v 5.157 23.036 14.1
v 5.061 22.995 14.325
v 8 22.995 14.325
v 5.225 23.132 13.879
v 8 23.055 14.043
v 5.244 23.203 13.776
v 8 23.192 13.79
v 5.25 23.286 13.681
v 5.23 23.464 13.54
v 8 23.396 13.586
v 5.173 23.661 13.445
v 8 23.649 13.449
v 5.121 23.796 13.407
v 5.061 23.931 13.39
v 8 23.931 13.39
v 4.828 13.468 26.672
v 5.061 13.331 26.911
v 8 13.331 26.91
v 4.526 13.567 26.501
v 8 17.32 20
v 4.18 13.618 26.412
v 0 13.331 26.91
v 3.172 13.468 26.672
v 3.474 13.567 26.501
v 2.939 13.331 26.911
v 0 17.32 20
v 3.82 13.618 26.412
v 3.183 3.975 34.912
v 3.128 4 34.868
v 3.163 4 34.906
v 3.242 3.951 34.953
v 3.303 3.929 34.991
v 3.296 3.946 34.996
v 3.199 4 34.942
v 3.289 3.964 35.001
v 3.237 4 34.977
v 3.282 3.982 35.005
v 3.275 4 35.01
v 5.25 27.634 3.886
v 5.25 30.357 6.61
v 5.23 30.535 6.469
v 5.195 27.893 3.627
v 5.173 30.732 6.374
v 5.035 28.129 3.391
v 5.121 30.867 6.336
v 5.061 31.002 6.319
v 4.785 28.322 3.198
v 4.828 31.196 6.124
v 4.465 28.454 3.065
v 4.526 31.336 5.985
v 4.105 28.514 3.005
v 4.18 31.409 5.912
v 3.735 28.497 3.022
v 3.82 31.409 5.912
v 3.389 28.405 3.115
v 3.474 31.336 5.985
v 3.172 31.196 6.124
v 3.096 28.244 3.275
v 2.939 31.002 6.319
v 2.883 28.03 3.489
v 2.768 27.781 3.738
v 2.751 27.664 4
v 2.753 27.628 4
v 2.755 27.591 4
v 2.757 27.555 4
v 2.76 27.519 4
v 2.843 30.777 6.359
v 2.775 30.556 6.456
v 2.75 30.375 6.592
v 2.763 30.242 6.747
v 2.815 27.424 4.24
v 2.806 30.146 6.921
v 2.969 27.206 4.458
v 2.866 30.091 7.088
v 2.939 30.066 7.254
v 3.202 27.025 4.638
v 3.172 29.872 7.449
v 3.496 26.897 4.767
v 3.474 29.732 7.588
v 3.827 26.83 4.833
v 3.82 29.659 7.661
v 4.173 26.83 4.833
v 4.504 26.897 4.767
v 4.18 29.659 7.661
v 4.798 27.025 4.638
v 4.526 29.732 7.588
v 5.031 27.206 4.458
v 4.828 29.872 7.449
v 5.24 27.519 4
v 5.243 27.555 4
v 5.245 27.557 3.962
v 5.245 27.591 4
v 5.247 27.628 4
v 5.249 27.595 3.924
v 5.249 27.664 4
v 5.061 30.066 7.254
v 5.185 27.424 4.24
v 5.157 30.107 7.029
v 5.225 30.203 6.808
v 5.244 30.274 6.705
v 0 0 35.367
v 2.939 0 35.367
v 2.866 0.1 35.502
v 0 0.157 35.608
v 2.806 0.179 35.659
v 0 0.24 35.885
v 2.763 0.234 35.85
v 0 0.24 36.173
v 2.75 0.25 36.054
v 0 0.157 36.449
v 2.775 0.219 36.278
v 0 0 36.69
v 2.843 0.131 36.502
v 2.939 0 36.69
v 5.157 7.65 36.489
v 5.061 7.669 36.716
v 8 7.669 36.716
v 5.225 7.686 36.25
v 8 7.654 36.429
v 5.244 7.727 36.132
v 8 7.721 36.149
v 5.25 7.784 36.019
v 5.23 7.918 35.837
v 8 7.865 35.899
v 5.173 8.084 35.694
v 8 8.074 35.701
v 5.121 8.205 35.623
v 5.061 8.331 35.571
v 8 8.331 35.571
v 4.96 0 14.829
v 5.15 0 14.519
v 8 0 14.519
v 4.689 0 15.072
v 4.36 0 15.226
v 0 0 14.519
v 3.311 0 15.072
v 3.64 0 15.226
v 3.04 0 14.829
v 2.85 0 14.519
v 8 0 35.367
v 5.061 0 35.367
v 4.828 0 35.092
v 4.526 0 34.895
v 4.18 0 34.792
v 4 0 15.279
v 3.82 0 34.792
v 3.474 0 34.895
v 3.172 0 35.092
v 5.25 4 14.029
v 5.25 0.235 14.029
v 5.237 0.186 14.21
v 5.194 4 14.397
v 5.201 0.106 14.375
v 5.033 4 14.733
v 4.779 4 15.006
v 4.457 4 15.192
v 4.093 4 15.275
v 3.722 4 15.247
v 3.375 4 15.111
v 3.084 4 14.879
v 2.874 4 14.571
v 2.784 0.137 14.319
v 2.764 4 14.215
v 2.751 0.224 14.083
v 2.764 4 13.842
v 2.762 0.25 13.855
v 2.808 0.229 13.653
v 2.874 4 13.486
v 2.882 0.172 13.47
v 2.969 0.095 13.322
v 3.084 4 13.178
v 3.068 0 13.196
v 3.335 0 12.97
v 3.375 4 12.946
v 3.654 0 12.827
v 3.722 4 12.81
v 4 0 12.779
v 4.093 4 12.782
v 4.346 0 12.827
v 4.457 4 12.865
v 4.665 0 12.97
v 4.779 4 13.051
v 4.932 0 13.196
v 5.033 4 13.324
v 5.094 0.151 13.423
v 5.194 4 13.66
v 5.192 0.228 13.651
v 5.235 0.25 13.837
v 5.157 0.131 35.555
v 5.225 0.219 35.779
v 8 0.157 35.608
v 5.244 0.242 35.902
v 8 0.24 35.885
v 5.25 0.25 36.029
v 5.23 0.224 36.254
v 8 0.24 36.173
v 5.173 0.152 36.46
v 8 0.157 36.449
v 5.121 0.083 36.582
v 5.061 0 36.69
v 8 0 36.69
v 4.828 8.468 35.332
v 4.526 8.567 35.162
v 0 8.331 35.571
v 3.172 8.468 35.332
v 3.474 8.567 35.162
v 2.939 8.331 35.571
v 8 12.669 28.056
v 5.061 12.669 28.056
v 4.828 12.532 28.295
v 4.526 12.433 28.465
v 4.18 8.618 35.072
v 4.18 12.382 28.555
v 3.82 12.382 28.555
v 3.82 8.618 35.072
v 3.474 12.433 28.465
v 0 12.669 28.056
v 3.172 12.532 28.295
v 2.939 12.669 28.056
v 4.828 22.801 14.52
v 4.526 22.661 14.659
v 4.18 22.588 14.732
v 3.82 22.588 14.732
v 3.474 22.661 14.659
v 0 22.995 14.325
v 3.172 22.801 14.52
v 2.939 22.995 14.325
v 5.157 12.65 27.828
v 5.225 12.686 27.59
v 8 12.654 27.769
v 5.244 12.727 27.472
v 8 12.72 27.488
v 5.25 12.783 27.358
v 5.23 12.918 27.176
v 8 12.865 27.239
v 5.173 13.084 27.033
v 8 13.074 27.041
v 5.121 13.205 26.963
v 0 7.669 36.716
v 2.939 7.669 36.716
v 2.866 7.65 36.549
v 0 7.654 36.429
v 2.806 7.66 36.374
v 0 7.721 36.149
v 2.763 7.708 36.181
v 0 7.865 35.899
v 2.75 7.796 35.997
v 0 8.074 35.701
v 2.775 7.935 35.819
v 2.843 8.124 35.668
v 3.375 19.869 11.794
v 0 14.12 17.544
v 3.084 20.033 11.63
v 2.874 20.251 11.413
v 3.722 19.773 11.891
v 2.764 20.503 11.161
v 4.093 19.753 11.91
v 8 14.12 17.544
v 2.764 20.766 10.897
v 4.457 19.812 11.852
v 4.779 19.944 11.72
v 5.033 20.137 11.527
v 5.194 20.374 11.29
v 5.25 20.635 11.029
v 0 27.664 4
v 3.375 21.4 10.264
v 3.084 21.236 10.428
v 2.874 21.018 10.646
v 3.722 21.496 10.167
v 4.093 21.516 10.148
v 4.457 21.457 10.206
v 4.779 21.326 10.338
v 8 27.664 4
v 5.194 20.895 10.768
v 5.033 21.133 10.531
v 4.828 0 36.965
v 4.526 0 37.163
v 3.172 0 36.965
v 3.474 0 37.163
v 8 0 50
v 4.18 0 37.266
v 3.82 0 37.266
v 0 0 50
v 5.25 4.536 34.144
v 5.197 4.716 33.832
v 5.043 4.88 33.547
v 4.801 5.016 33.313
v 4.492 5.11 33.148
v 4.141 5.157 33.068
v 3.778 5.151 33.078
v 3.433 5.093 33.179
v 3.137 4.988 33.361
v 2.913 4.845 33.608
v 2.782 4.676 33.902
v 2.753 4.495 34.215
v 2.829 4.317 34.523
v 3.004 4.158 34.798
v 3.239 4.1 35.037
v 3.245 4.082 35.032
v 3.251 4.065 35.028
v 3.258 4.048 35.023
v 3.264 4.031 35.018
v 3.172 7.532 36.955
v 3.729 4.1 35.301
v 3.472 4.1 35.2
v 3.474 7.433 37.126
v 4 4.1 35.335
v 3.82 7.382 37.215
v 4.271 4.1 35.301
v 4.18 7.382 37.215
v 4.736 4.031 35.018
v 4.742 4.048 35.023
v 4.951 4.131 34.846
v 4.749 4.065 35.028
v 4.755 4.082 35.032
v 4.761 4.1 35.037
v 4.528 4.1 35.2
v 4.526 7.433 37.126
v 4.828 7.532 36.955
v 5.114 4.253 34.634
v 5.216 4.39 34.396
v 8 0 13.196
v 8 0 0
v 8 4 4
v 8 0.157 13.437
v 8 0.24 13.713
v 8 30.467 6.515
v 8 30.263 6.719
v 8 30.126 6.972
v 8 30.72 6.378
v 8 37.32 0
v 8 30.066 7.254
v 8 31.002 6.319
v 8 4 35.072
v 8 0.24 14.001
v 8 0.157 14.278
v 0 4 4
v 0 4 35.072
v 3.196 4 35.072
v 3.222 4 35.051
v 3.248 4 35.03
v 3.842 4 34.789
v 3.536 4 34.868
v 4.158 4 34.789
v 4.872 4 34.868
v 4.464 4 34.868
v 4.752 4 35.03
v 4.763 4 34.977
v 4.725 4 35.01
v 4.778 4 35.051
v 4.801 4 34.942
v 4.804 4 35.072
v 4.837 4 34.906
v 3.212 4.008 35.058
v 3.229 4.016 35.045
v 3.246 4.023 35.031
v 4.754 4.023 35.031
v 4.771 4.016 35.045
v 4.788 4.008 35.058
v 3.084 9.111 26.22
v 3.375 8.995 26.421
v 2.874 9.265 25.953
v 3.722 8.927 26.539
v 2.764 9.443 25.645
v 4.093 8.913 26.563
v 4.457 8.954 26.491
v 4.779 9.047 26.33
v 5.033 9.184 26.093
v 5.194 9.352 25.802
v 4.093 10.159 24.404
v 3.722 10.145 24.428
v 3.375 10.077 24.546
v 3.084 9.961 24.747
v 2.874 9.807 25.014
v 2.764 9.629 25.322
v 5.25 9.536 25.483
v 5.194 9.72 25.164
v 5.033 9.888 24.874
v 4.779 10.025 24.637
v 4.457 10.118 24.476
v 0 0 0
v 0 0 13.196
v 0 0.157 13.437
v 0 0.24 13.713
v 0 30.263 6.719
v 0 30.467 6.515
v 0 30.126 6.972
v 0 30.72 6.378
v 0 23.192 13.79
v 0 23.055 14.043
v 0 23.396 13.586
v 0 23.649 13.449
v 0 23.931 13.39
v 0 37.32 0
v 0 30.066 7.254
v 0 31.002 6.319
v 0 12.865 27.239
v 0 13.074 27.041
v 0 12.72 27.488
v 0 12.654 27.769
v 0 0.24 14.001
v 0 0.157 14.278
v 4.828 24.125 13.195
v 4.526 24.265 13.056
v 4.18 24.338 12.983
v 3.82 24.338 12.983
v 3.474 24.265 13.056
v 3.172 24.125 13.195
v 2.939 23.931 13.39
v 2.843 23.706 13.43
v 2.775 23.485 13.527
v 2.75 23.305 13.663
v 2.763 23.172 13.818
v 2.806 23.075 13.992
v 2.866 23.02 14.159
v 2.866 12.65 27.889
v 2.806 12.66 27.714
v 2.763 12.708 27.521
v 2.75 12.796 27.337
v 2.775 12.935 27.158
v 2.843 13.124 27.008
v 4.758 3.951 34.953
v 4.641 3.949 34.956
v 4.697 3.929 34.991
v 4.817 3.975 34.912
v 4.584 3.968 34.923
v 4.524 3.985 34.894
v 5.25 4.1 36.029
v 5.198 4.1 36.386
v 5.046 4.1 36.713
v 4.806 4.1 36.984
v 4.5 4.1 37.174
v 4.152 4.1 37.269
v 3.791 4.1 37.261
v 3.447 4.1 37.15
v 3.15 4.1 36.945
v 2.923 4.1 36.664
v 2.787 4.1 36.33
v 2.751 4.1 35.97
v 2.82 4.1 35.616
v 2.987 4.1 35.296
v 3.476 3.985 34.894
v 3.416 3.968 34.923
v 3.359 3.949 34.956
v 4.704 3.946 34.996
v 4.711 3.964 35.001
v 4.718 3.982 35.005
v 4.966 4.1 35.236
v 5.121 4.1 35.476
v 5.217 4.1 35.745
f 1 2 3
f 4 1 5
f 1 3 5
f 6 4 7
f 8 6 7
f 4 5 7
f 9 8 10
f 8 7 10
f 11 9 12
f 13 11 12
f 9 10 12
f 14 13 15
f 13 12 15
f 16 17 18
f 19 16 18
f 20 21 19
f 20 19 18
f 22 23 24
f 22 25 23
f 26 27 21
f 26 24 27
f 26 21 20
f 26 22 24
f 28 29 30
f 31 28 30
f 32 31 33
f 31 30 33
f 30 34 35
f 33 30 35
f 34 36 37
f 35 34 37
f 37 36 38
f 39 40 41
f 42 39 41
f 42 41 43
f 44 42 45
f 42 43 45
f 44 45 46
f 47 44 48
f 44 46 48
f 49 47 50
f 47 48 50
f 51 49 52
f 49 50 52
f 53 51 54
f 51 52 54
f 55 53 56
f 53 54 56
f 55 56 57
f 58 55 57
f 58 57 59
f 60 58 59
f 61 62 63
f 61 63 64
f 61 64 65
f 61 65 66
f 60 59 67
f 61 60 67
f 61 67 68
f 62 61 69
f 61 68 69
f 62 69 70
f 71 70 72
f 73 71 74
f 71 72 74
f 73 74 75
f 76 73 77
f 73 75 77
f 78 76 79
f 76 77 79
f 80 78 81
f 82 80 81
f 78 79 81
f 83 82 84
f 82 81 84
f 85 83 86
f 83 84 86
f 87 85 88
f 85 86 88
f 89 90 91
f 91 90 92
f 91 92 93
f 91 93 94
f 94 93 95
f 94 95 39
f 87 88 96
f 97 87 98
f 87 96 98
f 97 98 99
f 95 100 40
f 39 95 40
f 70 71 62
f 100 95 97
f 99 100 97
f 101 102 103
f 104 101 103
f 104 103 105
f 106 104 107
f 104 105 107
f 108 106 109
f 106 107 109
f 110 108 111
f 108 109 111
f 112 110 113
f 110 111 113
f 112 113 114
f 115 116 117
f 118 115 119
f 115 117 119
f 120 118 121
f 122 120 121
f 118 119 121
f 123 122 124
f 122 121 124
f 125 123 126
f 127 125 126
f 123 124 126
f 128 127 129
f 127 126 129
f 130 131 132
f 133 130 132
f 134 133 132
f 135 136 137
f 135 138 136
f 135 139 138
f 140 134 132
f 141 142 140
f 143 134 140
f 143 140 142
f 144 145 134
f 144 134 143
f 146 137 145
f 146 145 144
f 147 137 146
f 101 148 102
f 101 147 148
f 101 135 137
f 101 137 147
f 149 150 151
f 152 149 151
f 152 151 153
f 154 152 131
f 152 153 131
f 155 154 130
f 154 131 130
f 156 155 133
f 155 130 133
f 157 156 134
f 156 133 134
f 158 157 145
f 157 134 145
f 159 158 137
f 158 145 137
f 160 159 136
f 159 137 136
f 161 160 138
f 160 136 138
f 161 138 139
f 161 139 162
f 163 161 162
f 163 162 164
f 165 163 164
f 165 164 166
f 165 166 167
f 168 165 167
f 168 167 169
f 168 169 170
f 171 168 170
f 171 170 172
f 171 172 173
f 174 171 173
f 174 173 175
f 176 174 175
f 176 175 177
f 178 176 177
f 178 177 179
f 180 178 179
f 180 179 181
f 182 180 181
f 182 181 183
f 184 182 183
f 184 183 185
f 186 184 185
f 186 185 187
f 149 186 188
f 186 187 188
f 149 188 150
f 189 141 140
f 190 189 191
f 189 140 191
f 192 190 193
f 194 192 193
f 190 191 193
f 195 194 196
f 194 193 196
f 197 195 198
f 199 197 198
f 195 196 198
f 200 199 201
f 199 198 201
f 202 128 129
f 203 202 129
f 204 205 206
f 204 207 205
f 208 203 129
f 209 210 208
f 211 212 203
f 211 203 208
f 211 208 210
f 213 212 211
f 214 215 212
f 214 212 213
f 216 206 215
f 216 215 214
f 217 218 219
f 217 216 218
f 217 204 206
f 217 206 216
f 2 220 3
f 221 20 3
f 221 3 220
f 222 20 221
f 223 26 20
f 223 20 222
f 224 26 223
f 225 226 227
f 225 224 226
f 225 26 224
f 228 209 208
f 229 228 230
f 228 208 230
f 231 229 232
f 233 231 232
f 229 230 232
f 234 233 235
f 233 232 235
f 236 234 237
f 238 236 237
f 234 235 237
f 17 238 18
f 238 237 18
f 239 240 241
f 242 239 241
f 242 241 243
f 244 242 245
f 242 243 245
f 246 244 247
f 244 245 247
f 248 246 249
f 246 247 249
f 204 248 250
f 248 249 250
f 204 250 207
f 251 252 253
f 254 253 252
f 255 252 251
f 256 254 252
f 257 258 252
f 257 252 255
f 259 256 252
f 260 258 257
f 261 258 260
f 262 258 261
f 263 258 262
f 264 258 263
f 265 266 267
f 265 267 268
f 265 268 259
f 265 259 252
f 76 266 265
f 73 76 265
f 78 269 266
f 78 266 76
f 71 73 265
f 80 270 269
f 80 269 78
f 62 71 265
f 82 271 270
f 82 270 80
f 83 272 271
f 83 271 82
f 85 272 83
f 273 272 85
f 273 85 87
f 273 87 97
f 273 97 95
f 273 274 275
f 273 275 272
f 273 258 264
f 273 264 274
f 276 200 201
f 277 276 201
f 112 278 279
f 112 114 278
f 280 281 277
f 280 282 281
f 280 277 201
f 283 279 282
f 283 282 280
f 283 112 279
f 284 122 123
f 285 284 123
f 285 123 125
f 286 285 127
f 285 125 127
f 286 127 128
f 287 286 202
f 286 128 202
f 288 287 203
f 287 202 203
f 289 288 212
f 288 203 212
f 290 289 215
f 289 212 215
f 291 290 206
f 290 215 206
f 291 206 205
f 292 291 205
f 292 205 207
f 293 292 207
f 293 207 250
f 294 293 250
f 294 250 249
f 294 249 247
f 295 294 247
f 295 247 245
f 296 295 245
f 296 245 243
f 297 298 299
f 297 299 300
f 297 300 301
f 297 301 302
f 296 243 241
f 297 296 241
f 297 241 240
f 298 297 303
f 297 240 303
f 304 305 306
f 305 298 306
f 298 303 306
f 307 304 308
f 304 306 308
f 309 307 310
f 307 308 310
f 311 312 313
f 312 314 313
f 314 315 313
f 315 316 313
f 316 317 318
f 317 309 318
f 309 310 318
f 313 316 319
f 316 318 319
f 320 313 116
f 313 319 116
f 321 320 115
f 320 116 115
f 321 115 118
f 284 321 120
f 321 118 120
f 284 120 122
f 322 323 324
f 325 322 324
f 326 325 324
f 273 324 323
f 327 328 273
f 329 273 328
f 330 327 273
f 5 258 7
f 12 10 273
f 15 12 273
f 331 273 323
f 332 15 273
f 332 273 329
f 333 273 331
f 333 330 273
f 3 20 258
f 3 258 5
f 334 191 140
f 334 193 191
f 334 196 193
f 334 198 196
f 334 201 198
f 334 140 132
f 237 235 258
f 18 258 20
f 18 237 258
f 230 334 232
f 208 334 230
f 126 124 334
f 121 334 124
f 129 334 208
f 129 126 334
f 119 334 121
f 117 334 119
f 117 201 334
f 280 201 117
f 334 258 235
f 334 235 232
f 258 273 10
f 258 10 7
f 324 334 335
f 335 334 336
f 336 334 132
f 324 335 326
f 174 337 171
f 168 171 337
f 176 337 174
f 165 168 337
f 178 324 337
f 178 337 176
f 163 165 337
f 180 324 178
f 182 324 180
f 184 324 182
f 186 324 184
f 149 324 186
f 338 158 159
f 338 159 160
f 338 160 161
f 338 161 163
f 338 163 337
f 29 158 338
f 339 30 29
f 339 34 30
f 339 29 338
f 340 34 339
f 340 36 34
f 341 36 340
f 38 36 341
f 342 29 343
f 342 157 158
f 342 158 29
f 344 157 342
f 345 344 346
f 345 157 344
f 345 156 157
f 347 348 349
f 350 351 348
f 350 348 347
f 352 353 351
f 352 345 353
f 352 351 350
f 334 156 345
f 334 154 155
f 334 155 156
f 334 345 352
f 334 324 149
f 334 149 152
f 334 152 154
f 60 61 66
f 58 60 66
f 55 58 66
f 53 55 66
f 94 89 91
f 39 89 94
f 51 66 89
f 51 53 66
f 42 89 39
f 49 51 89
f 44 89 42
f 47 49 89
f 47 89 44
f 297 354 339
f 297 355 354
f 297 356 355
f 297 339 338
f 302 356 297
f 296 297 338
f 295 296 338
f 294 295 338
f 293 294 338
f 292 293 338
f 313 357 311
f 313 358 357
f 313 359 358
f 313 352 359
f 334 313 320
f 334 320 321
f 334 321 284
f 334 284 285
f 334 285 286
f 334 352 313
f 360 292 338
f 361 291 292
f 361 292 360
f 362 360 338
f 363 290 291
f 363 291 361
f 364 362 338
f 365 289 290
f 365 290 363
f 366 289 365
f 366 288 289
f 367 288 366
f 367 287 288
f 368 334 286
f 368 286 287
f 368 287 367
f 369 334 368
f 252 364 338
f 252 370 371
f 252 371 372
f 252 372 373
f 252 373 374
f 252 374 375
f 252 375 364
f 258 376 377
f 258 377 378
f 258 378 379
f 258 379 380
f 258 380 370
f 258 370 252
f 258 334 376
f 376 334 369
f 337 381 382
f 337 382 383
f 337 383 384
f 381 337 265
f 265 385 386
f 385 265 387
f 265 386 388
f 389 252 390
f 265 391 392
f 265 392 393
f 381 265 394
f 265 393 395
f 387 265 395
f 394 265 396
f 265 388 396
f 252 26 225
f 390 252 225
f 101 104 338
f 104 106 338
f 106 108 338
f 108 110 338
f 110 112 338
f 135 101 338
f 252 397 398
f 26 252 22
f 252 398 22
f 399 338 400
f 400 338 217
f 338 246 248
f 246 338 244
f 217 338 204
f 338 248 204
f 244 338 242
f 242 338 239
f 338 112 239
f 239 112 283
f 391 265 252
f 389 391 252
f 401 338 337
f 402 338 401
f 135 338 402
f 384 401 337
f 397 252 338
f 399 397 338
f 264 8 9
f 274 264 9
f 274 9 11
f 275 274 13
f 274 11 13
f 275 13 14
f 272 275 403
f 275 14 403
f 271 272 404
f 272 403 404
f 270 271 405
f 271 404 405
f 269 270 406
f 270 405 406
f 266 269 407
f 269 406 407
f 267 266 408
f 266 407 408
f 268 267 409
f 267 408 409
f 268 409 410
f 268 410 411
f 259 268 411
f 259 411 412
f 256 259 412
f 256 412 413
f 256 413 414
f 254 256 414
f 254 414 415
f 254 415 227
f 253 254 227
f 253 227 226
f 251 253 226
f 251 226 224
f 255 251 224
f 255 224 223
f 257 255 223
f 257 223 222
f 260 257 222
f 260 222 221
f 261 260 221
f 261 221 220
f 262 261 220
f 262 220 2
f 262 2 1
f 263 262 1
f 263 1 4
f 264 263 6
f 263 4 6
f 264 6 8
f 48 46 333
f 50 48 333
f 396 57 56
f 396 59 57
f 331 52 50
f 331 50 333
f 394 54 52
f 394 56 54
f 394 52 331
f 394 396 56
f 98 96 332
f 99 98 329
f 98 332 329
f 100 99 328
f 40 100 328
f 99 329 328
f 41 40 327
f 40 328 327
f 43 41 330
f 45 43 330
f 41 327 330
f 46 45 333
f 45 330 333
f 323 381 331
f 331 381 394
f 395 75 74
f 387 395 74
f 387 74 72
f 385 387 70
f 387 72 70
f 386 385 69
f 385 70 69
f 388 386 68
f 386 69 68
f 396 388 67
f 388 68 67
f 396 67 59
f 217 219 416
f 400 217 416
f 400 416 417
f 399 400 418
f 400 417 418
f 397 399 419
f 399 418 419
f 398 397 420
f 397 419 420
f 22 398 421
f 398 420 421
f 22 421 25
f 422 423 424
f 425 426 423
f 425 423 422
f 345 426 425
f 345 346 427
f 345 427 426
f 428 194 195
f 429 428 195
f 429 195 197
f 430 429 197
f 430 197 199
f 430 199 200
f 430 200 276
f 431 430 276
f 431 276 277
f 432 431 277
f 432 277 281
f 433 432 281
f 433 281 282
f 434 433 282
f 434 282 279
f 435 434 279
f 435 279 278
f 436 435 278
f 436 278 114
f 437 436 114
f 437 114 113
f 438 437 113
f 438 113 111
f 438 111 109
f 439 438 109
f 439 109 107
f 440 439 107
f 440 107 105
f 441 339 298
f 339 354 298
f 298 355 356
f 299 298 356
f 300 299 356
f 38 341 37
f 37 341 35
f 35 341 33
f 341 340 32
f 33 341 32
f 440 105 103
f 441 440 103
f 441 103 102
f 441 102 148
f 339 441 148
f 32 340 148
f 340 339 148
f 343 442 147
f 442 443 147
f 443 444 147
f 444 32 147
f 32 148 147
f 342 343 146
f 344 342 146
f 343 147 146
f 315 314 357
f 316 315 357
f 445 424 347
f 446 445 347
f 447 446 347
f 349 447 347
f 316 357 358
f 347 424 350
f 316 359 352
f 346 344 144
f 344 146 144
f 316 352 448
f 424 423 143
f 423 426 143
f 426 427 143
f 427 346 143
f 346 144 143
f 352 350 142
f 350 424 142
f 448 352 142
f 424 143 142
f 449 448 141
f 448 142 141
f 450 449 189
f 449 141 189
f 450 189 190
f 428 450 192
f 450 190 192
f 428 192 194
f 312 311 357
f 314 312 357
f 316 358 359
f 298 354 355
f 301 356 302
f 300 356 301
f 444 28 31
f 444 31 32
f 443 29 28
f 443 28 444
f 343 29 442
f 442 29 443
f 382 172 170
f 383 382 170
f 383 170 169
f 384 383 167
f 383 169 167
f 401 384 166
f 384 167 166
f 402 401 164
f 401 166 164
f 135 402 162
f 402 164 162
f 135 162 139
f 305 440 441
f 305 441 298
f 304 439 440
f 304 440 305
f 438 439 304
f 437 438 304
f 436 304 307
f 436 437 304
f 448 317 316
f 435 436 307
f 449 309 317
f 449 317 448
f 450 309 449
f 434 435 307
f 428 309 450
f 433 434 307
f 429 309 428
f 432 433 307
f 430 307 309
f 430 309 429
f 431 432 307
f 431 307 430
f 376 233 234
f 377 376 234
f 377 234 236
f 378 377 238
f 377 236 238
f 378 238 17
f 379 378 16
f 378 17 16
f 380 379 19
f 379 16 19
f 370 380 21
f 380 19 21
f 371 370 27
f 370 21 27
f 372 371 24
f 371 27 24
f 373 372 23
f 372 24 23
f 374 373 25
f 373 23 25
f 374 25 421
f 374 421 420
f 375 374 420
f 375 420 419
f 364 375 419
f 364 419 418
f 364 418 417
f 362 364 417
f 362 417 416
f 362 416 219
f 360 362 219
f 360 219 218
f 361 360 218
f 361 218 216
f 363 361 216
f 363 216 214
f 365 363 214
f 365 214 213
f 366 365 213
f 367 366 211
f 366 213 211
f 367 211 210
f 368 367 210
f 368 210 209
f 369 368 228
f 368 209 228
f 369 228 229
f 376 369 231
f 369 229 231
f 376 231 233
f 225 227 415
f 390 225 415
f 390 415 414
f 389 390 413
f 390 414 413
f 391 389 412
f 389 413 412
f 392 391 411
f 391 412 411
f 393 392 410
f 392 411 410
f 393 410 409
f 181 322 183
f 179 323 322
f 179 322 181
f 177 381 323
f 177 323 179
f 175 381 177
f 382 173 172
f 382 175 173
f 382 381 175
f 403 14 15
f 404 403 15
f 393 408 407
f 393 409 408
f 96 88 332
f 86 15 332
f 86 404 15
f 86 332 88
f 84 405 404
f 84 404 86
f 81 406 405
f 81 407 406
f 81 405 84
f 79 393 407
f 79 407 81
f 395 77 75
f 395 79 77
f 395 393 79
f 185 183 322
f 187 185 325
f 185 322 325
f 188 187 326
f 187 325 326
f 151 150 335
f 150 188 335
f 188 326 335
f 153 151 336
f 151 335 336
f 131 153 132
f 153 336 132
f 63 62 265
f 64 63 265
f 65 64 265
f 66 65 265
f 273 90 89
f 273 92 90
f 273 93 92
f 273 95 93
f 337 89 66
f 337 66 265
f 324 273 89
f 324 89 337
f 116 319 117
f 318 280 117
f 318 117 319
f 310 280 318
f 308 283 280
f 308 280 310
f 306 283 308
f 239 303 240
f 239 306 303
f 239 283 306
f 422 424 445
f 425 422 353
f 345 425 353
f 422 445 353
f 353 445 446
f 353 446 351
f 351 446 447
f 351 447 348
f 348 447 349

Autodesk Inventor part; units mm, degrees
ref_plane "YZ Plane" through (0, 0, 0) normal (1, 0, 0) x (0, 1, 0)
ref_plane "XZ Plane" through (0, 0, 0) normal (0, 1, 0) x (-1, 0, 0)
ref_plane "XY Plane" through (0, 0, 0) normal (0, 0, 1) x (1, 0, 0)
sketch "스케치1" plane through (0, 0, 0) normal (1, 0, 0) x (0, 1, 0)
  line L0 (0, 0) -> (0, 20)
  line L1 (0, 20) -> (0, 50)
  line L2 (0, 0) -> (37.3205, 0)
  line L3 (0, 20) -> (17.3205, 20)
  line L4 (0, 50) -> (17.3205, 20)
  line L5 (0, 50) -> (34.641, 50) construction
  line L6 (17.3205, 20) -> (37.3205, 0)
  line L7 (17.3205, 20) -> (45.6048, 20) construction
  dimension "d0" = 20
  dimension "d1" = 30
  dimension "d2" = 60
  dimension "d3" = 45
extrude "돌출1" add sketch "스케치1" along normal blind 8
sketch "스케치2" plane through (8, 0, 0) normal (1, 0, 0) x (0, 0, -1)
  line L0 (-20, 17.3205) -> (-50, 0) projected
  line L1 (-50, 0) -> (0, 0) projected
  line L2 (0, 0) -> (0, 37.3205) projected
  line L3 (0, 37.3205) -> (-20, 17.3205) projected
  line L4 (-35.0718, 4) -> (-17.5439, 14.1197)
  line L5 (-17.5439, 14.1197) -> (-4, 27.6637)
  line L6 (-4, 27.6637) -> (-4, 4)
  line L7 (-4, 4) -> (-35.0718, 4)
  dimension "d6" = 4
extrude "돌출2" cut sketch "스케치2" against normal blind 8 contours L4 L5 L6 L7
sketch "스케치5" plane through (0, 0, 0) normal (0, -1, 0) x (1, 0, 0)
  arc A0 (157.7, 33) -> (156.7, 34) centre (156.7, 33) ccw projected
  line L0 (157.7, 33) -> (157.7, 24) projected
  arc A1 (156.7, 23) -> (157.7, 24) centre (156.7, 24) ccw projected
  line L1 (156.7, 23) -> (136.7, 23) projected
  arc A2 (135.7, 24) -> (136.7, 23) centre (136.7, 24) ccw projected
  line L2 (135.7, 24) -> (135.7, 33) projected
  arc A3 (136.7, 34) -> (135.7, 33) centre (136.7, 33) ccw projected
  line L3 (136.7, 34) -> (156.7, 34) projected
  arc A4 (-61.9, 33) -> (-62.9, 34) centre (-62.9, 33) ccw projected
  line L4 (-61.9, 33) -> (-61.9, 24) projected
  arc A5 (-62.9, 23) -> (-61.9, 24) centre (-62.9, 24) ccw projected
  line L5 (-62.9, 23) -> (-82.9, 23) projected
  arc A6 (-83.9, 24) -> (-82.9, 23) centre (-82.9, 24) ccw projected
  line L6 (-83.9, 24) -> (-83.9, 33) projected
  arc A7 (-82.9, 34) -> (-83.9, 33) centre (-82.9, 33) ccw projected
  line L7 (-82.9, 34) -> (-62.9, 34) projected
  arc A8 (-61.9, -244) -> (-62.9, -243) centre (-62.9, -244) ccw projected
  line L8 (-61.9, -244) -> (-61.9, -253) projected
  arc A9 (-62.9, -254) -> (-61.9, -253) centre (-62.9, -253) ccw projected
  line L9 (-62.9, -254) -> (-82.9, -254) projected
  arc A10 (-83.9, -253) -> (-82.9, -254) centre (-82.9, -253) ccw projected
  line L10 (-83.9, -253) -> (-83.9, -244) projected
  arc A11 (-82.9, -243) -> (-83.9, -244) centre (-82.9, -244) ccw projected
  line L11 (-82.9, -243) -> (-62.9, -243) projected
  arc A12 (136.7, -243) -> (135.7, -244) centre (136.7, -244) ccw projected
  line L12 (136.7, -243) -> (156.7, -243) projected
  arc A13 (157.7, -244) -> (156.7, -243) centre (156.7, -244) ccw projected
  line L13 (157.7, -244) -> (157.7, -253) projected
  arc A14 (156.7, -254) -> (157.7, -253) centre (156.7, -253) ccw projected
  line L14 (156.7, -254) -> (136.7, -254) projected
  arc A15 (135.7, -253) -> (136.7, -254) centre (136.7, -253) ccw projected
  line L15 (135.7, -253) -> (135.7, -244) projected
  line L16 (-98.1, 40) -> (171.9, 40) projected
  line L17 (-98.1, 0) -> (-98.1, 40) projected
  line L18 (-58.1, 0) -> (-98.1, 0) projected
  line L19 (-58.1, -220) -> (-58.1, 0) projected
  line L20 (-98.1, -220) -> (-58.1, -220) projected
  line L21 (-98.1, -260) -> (-98.1, -220) projected
  line L22 (171.9, -260) -> (-98.1, -260) projected
  line L23 (171.9, -220) -> (171.9, -260) projected
  line L24 (131.9, -220) -> (171.9, -220) projected
  line L25 (131.9, 0) -> (131.9, -220) projected
  line L26 (171.9, 0) -> (131.9, 0) projected
  line L27 (171.9, 40) -> (171.9, 0) projected
  circle A16 centre (4, 14.0286) radius 1.25
  circle A17 centre (4, 36.0286) radius 1.25
  point P0 (0, 0)
  dimension "d17" = 2.5
  dimension "d18" = 2.5
extrude "돌출5" cut sketch "스케치5" against normal blind 4.1 contours A16 | A17
sketch "스케치8" plane through (0, 17.3205, 20) normal (0, 0.7071, 0.7071) x (1, 0, 0)
  circle A0 centre (4, 8.6869) radius 1.5
  circle A1 centre (4, 18.6869) radius 1.5
  circle A2 centre (4, 18.6869) radius 1.25
  circle A3 centre (4, 8.6869) radius 1.25
  point P0 (0, 1.8947)
  dimension "d35" = 2.5
  dimension "d36" = 2.5
extrude "돌출7" cut sketch "스케치8" against normal blind 4.1 contours A2 | A3
sketch "스케치9" plane through (0, 0, 50) normal (0, 0.866, 0.5) x (1, 0, 0)
  circle A0 centre (4, 26) radius 1.5
  circle A1 centre (4, 16) radius 1.5
  circle A2 centre (4, 26) radius 1.25
  circle A3 centre (4, 16) radius 1.25
  point P0 (0, 43.3013)
  dimension "d39" = 2.5
  dimension "d40" = 2.5
extrude "돌출8" cut sketch "스케치9" against normal blind 4.1 contours A2 | A3
sketch "스케치10" plane through (8, 0, 0) normal (1, 0, 0) x (0, 0, -1)
  line L0 (-35.037, 4.1) -> (-35.037, 4.1) projected
  line L1 (-35.0184, 4.0308) -> (-35.037, 4.1) projected
  line L2 (-35.0184, 4.0308) -> (-35.0184, 4.0308) projected
  line L3 (-35.037, 4.1) -> (-35.0184, 4.0308) projected
  line L4 (-37.2261, 7.375) -> (-35.0611, 8.625) projected
  line L5 (-24.4008, 10.1609) -> (-26.5659, 8.9109) projected
  line L6 (-28.5659, 12.375) -> (-26.4008, 13.625) projected
  line L7 (-10.1451, 21.5185) -> (-11.9129, 19.7508) projected
  line L8 (-14.7413, 22.5792) -> (-12.9735, 24.347) projected
  line L9 (-7.6702, 29.6503) -> (-5.9025, 31.418) projected
  line L10 (-4, 27.5222) -> (-4, 27.6637) projected
  line L11 (-4, 27.5222) -> (-4, 27.5222) projected
  line L12 (-4, 27.6637) -> (-4, 27.5222) projected
  line L13 (-4, 27.6637) -> (-4, 27.6637) projected
  line L14 (-15.2786, 4) -> (-12.7786, 4) projected
  line L15 (-12.7786, 0) -> (-15.2786, 0) projected
  line L16 (-35.037, 4.1) -> (-35.0184, 4.0308) projected
  line L17 (-35.0718, 4) -> (-35.0184, 4.0308) projected
  line L18 (-35.0102, 4) -> (-35.0718, 4) projected
  line L19 (-35.0102, 4) -> (-34.9916, 3.9308) projected
  line L20 (-34.9916, 3.9308) -> (-34.8718, 4) projected
  line L21 (-34.8718, 4) -> (-34.8718, 4) projected
  line L22 (-34.8718, 4) -> (-34.9916, 3.9308) projected
  line L23 (-34.9916, 3.9308) -> (-35.0102, 4) projected
  line L24 (-35.0718, 4) -> (-35.0102, 4) projected
  line L25 (-35.0184, 4.0308) -> (-35.0718, 4) projected
  line L26 (-35.0184, 4.0308) -> (-35.037, 4.1) projected
  line L27 (-35.037, 4.1) -> (-35.037, 4.1) projected
  line L28 (-34.7786, 0) -> (-37.2786, 0) projected
  arc A0 (-36.7164, 7.6693) -> (-35.5708, 8.3307) centre (-36.5186, 8.6495) ccw
  arc A1 (-28.0562, 12.6693) -> (-26.9105, 13.3307) centre (-27.8583, 13.6495) ccw
  arc A2 (-14.3251, 22.9954) -> (-13.3897, 23.9308) centre (-14.3878, 23.9934) ccw
  arc A3 (-7.2541, 30.0664) -> (-6.3187, 31.0019) centre (-7.3167, 31.0645) ccw
  arc A4 (-13.196, 0) -> (-14.5189, 0) centre (-13.8574, -0.75) ccw
  arc A5 (-35.3671, 0) -> (-36.69, 0) centre (-36.0286, -0.75) ccw
  point P0 (0, 0)
  dimension "d43" = 2
  dimension "d44" = 2
  dimension "d45" = 2
  dimension "d46" = 2
  dimension "d47" = 2
  dimension "d48" = 2
  dimension "d49" = 0.75
  dimension "d50" = 0.75
  dimension "d51" = 0.75
  dimension "d52" = 0.75
  dimension "d53" = 0.75
  dimension "d54" = 0.75
extrude "돌출9" cut sketch "스케치10" against normal blind 8
properties part number "칼팁중간받침대" material "알루미늄 6061"
